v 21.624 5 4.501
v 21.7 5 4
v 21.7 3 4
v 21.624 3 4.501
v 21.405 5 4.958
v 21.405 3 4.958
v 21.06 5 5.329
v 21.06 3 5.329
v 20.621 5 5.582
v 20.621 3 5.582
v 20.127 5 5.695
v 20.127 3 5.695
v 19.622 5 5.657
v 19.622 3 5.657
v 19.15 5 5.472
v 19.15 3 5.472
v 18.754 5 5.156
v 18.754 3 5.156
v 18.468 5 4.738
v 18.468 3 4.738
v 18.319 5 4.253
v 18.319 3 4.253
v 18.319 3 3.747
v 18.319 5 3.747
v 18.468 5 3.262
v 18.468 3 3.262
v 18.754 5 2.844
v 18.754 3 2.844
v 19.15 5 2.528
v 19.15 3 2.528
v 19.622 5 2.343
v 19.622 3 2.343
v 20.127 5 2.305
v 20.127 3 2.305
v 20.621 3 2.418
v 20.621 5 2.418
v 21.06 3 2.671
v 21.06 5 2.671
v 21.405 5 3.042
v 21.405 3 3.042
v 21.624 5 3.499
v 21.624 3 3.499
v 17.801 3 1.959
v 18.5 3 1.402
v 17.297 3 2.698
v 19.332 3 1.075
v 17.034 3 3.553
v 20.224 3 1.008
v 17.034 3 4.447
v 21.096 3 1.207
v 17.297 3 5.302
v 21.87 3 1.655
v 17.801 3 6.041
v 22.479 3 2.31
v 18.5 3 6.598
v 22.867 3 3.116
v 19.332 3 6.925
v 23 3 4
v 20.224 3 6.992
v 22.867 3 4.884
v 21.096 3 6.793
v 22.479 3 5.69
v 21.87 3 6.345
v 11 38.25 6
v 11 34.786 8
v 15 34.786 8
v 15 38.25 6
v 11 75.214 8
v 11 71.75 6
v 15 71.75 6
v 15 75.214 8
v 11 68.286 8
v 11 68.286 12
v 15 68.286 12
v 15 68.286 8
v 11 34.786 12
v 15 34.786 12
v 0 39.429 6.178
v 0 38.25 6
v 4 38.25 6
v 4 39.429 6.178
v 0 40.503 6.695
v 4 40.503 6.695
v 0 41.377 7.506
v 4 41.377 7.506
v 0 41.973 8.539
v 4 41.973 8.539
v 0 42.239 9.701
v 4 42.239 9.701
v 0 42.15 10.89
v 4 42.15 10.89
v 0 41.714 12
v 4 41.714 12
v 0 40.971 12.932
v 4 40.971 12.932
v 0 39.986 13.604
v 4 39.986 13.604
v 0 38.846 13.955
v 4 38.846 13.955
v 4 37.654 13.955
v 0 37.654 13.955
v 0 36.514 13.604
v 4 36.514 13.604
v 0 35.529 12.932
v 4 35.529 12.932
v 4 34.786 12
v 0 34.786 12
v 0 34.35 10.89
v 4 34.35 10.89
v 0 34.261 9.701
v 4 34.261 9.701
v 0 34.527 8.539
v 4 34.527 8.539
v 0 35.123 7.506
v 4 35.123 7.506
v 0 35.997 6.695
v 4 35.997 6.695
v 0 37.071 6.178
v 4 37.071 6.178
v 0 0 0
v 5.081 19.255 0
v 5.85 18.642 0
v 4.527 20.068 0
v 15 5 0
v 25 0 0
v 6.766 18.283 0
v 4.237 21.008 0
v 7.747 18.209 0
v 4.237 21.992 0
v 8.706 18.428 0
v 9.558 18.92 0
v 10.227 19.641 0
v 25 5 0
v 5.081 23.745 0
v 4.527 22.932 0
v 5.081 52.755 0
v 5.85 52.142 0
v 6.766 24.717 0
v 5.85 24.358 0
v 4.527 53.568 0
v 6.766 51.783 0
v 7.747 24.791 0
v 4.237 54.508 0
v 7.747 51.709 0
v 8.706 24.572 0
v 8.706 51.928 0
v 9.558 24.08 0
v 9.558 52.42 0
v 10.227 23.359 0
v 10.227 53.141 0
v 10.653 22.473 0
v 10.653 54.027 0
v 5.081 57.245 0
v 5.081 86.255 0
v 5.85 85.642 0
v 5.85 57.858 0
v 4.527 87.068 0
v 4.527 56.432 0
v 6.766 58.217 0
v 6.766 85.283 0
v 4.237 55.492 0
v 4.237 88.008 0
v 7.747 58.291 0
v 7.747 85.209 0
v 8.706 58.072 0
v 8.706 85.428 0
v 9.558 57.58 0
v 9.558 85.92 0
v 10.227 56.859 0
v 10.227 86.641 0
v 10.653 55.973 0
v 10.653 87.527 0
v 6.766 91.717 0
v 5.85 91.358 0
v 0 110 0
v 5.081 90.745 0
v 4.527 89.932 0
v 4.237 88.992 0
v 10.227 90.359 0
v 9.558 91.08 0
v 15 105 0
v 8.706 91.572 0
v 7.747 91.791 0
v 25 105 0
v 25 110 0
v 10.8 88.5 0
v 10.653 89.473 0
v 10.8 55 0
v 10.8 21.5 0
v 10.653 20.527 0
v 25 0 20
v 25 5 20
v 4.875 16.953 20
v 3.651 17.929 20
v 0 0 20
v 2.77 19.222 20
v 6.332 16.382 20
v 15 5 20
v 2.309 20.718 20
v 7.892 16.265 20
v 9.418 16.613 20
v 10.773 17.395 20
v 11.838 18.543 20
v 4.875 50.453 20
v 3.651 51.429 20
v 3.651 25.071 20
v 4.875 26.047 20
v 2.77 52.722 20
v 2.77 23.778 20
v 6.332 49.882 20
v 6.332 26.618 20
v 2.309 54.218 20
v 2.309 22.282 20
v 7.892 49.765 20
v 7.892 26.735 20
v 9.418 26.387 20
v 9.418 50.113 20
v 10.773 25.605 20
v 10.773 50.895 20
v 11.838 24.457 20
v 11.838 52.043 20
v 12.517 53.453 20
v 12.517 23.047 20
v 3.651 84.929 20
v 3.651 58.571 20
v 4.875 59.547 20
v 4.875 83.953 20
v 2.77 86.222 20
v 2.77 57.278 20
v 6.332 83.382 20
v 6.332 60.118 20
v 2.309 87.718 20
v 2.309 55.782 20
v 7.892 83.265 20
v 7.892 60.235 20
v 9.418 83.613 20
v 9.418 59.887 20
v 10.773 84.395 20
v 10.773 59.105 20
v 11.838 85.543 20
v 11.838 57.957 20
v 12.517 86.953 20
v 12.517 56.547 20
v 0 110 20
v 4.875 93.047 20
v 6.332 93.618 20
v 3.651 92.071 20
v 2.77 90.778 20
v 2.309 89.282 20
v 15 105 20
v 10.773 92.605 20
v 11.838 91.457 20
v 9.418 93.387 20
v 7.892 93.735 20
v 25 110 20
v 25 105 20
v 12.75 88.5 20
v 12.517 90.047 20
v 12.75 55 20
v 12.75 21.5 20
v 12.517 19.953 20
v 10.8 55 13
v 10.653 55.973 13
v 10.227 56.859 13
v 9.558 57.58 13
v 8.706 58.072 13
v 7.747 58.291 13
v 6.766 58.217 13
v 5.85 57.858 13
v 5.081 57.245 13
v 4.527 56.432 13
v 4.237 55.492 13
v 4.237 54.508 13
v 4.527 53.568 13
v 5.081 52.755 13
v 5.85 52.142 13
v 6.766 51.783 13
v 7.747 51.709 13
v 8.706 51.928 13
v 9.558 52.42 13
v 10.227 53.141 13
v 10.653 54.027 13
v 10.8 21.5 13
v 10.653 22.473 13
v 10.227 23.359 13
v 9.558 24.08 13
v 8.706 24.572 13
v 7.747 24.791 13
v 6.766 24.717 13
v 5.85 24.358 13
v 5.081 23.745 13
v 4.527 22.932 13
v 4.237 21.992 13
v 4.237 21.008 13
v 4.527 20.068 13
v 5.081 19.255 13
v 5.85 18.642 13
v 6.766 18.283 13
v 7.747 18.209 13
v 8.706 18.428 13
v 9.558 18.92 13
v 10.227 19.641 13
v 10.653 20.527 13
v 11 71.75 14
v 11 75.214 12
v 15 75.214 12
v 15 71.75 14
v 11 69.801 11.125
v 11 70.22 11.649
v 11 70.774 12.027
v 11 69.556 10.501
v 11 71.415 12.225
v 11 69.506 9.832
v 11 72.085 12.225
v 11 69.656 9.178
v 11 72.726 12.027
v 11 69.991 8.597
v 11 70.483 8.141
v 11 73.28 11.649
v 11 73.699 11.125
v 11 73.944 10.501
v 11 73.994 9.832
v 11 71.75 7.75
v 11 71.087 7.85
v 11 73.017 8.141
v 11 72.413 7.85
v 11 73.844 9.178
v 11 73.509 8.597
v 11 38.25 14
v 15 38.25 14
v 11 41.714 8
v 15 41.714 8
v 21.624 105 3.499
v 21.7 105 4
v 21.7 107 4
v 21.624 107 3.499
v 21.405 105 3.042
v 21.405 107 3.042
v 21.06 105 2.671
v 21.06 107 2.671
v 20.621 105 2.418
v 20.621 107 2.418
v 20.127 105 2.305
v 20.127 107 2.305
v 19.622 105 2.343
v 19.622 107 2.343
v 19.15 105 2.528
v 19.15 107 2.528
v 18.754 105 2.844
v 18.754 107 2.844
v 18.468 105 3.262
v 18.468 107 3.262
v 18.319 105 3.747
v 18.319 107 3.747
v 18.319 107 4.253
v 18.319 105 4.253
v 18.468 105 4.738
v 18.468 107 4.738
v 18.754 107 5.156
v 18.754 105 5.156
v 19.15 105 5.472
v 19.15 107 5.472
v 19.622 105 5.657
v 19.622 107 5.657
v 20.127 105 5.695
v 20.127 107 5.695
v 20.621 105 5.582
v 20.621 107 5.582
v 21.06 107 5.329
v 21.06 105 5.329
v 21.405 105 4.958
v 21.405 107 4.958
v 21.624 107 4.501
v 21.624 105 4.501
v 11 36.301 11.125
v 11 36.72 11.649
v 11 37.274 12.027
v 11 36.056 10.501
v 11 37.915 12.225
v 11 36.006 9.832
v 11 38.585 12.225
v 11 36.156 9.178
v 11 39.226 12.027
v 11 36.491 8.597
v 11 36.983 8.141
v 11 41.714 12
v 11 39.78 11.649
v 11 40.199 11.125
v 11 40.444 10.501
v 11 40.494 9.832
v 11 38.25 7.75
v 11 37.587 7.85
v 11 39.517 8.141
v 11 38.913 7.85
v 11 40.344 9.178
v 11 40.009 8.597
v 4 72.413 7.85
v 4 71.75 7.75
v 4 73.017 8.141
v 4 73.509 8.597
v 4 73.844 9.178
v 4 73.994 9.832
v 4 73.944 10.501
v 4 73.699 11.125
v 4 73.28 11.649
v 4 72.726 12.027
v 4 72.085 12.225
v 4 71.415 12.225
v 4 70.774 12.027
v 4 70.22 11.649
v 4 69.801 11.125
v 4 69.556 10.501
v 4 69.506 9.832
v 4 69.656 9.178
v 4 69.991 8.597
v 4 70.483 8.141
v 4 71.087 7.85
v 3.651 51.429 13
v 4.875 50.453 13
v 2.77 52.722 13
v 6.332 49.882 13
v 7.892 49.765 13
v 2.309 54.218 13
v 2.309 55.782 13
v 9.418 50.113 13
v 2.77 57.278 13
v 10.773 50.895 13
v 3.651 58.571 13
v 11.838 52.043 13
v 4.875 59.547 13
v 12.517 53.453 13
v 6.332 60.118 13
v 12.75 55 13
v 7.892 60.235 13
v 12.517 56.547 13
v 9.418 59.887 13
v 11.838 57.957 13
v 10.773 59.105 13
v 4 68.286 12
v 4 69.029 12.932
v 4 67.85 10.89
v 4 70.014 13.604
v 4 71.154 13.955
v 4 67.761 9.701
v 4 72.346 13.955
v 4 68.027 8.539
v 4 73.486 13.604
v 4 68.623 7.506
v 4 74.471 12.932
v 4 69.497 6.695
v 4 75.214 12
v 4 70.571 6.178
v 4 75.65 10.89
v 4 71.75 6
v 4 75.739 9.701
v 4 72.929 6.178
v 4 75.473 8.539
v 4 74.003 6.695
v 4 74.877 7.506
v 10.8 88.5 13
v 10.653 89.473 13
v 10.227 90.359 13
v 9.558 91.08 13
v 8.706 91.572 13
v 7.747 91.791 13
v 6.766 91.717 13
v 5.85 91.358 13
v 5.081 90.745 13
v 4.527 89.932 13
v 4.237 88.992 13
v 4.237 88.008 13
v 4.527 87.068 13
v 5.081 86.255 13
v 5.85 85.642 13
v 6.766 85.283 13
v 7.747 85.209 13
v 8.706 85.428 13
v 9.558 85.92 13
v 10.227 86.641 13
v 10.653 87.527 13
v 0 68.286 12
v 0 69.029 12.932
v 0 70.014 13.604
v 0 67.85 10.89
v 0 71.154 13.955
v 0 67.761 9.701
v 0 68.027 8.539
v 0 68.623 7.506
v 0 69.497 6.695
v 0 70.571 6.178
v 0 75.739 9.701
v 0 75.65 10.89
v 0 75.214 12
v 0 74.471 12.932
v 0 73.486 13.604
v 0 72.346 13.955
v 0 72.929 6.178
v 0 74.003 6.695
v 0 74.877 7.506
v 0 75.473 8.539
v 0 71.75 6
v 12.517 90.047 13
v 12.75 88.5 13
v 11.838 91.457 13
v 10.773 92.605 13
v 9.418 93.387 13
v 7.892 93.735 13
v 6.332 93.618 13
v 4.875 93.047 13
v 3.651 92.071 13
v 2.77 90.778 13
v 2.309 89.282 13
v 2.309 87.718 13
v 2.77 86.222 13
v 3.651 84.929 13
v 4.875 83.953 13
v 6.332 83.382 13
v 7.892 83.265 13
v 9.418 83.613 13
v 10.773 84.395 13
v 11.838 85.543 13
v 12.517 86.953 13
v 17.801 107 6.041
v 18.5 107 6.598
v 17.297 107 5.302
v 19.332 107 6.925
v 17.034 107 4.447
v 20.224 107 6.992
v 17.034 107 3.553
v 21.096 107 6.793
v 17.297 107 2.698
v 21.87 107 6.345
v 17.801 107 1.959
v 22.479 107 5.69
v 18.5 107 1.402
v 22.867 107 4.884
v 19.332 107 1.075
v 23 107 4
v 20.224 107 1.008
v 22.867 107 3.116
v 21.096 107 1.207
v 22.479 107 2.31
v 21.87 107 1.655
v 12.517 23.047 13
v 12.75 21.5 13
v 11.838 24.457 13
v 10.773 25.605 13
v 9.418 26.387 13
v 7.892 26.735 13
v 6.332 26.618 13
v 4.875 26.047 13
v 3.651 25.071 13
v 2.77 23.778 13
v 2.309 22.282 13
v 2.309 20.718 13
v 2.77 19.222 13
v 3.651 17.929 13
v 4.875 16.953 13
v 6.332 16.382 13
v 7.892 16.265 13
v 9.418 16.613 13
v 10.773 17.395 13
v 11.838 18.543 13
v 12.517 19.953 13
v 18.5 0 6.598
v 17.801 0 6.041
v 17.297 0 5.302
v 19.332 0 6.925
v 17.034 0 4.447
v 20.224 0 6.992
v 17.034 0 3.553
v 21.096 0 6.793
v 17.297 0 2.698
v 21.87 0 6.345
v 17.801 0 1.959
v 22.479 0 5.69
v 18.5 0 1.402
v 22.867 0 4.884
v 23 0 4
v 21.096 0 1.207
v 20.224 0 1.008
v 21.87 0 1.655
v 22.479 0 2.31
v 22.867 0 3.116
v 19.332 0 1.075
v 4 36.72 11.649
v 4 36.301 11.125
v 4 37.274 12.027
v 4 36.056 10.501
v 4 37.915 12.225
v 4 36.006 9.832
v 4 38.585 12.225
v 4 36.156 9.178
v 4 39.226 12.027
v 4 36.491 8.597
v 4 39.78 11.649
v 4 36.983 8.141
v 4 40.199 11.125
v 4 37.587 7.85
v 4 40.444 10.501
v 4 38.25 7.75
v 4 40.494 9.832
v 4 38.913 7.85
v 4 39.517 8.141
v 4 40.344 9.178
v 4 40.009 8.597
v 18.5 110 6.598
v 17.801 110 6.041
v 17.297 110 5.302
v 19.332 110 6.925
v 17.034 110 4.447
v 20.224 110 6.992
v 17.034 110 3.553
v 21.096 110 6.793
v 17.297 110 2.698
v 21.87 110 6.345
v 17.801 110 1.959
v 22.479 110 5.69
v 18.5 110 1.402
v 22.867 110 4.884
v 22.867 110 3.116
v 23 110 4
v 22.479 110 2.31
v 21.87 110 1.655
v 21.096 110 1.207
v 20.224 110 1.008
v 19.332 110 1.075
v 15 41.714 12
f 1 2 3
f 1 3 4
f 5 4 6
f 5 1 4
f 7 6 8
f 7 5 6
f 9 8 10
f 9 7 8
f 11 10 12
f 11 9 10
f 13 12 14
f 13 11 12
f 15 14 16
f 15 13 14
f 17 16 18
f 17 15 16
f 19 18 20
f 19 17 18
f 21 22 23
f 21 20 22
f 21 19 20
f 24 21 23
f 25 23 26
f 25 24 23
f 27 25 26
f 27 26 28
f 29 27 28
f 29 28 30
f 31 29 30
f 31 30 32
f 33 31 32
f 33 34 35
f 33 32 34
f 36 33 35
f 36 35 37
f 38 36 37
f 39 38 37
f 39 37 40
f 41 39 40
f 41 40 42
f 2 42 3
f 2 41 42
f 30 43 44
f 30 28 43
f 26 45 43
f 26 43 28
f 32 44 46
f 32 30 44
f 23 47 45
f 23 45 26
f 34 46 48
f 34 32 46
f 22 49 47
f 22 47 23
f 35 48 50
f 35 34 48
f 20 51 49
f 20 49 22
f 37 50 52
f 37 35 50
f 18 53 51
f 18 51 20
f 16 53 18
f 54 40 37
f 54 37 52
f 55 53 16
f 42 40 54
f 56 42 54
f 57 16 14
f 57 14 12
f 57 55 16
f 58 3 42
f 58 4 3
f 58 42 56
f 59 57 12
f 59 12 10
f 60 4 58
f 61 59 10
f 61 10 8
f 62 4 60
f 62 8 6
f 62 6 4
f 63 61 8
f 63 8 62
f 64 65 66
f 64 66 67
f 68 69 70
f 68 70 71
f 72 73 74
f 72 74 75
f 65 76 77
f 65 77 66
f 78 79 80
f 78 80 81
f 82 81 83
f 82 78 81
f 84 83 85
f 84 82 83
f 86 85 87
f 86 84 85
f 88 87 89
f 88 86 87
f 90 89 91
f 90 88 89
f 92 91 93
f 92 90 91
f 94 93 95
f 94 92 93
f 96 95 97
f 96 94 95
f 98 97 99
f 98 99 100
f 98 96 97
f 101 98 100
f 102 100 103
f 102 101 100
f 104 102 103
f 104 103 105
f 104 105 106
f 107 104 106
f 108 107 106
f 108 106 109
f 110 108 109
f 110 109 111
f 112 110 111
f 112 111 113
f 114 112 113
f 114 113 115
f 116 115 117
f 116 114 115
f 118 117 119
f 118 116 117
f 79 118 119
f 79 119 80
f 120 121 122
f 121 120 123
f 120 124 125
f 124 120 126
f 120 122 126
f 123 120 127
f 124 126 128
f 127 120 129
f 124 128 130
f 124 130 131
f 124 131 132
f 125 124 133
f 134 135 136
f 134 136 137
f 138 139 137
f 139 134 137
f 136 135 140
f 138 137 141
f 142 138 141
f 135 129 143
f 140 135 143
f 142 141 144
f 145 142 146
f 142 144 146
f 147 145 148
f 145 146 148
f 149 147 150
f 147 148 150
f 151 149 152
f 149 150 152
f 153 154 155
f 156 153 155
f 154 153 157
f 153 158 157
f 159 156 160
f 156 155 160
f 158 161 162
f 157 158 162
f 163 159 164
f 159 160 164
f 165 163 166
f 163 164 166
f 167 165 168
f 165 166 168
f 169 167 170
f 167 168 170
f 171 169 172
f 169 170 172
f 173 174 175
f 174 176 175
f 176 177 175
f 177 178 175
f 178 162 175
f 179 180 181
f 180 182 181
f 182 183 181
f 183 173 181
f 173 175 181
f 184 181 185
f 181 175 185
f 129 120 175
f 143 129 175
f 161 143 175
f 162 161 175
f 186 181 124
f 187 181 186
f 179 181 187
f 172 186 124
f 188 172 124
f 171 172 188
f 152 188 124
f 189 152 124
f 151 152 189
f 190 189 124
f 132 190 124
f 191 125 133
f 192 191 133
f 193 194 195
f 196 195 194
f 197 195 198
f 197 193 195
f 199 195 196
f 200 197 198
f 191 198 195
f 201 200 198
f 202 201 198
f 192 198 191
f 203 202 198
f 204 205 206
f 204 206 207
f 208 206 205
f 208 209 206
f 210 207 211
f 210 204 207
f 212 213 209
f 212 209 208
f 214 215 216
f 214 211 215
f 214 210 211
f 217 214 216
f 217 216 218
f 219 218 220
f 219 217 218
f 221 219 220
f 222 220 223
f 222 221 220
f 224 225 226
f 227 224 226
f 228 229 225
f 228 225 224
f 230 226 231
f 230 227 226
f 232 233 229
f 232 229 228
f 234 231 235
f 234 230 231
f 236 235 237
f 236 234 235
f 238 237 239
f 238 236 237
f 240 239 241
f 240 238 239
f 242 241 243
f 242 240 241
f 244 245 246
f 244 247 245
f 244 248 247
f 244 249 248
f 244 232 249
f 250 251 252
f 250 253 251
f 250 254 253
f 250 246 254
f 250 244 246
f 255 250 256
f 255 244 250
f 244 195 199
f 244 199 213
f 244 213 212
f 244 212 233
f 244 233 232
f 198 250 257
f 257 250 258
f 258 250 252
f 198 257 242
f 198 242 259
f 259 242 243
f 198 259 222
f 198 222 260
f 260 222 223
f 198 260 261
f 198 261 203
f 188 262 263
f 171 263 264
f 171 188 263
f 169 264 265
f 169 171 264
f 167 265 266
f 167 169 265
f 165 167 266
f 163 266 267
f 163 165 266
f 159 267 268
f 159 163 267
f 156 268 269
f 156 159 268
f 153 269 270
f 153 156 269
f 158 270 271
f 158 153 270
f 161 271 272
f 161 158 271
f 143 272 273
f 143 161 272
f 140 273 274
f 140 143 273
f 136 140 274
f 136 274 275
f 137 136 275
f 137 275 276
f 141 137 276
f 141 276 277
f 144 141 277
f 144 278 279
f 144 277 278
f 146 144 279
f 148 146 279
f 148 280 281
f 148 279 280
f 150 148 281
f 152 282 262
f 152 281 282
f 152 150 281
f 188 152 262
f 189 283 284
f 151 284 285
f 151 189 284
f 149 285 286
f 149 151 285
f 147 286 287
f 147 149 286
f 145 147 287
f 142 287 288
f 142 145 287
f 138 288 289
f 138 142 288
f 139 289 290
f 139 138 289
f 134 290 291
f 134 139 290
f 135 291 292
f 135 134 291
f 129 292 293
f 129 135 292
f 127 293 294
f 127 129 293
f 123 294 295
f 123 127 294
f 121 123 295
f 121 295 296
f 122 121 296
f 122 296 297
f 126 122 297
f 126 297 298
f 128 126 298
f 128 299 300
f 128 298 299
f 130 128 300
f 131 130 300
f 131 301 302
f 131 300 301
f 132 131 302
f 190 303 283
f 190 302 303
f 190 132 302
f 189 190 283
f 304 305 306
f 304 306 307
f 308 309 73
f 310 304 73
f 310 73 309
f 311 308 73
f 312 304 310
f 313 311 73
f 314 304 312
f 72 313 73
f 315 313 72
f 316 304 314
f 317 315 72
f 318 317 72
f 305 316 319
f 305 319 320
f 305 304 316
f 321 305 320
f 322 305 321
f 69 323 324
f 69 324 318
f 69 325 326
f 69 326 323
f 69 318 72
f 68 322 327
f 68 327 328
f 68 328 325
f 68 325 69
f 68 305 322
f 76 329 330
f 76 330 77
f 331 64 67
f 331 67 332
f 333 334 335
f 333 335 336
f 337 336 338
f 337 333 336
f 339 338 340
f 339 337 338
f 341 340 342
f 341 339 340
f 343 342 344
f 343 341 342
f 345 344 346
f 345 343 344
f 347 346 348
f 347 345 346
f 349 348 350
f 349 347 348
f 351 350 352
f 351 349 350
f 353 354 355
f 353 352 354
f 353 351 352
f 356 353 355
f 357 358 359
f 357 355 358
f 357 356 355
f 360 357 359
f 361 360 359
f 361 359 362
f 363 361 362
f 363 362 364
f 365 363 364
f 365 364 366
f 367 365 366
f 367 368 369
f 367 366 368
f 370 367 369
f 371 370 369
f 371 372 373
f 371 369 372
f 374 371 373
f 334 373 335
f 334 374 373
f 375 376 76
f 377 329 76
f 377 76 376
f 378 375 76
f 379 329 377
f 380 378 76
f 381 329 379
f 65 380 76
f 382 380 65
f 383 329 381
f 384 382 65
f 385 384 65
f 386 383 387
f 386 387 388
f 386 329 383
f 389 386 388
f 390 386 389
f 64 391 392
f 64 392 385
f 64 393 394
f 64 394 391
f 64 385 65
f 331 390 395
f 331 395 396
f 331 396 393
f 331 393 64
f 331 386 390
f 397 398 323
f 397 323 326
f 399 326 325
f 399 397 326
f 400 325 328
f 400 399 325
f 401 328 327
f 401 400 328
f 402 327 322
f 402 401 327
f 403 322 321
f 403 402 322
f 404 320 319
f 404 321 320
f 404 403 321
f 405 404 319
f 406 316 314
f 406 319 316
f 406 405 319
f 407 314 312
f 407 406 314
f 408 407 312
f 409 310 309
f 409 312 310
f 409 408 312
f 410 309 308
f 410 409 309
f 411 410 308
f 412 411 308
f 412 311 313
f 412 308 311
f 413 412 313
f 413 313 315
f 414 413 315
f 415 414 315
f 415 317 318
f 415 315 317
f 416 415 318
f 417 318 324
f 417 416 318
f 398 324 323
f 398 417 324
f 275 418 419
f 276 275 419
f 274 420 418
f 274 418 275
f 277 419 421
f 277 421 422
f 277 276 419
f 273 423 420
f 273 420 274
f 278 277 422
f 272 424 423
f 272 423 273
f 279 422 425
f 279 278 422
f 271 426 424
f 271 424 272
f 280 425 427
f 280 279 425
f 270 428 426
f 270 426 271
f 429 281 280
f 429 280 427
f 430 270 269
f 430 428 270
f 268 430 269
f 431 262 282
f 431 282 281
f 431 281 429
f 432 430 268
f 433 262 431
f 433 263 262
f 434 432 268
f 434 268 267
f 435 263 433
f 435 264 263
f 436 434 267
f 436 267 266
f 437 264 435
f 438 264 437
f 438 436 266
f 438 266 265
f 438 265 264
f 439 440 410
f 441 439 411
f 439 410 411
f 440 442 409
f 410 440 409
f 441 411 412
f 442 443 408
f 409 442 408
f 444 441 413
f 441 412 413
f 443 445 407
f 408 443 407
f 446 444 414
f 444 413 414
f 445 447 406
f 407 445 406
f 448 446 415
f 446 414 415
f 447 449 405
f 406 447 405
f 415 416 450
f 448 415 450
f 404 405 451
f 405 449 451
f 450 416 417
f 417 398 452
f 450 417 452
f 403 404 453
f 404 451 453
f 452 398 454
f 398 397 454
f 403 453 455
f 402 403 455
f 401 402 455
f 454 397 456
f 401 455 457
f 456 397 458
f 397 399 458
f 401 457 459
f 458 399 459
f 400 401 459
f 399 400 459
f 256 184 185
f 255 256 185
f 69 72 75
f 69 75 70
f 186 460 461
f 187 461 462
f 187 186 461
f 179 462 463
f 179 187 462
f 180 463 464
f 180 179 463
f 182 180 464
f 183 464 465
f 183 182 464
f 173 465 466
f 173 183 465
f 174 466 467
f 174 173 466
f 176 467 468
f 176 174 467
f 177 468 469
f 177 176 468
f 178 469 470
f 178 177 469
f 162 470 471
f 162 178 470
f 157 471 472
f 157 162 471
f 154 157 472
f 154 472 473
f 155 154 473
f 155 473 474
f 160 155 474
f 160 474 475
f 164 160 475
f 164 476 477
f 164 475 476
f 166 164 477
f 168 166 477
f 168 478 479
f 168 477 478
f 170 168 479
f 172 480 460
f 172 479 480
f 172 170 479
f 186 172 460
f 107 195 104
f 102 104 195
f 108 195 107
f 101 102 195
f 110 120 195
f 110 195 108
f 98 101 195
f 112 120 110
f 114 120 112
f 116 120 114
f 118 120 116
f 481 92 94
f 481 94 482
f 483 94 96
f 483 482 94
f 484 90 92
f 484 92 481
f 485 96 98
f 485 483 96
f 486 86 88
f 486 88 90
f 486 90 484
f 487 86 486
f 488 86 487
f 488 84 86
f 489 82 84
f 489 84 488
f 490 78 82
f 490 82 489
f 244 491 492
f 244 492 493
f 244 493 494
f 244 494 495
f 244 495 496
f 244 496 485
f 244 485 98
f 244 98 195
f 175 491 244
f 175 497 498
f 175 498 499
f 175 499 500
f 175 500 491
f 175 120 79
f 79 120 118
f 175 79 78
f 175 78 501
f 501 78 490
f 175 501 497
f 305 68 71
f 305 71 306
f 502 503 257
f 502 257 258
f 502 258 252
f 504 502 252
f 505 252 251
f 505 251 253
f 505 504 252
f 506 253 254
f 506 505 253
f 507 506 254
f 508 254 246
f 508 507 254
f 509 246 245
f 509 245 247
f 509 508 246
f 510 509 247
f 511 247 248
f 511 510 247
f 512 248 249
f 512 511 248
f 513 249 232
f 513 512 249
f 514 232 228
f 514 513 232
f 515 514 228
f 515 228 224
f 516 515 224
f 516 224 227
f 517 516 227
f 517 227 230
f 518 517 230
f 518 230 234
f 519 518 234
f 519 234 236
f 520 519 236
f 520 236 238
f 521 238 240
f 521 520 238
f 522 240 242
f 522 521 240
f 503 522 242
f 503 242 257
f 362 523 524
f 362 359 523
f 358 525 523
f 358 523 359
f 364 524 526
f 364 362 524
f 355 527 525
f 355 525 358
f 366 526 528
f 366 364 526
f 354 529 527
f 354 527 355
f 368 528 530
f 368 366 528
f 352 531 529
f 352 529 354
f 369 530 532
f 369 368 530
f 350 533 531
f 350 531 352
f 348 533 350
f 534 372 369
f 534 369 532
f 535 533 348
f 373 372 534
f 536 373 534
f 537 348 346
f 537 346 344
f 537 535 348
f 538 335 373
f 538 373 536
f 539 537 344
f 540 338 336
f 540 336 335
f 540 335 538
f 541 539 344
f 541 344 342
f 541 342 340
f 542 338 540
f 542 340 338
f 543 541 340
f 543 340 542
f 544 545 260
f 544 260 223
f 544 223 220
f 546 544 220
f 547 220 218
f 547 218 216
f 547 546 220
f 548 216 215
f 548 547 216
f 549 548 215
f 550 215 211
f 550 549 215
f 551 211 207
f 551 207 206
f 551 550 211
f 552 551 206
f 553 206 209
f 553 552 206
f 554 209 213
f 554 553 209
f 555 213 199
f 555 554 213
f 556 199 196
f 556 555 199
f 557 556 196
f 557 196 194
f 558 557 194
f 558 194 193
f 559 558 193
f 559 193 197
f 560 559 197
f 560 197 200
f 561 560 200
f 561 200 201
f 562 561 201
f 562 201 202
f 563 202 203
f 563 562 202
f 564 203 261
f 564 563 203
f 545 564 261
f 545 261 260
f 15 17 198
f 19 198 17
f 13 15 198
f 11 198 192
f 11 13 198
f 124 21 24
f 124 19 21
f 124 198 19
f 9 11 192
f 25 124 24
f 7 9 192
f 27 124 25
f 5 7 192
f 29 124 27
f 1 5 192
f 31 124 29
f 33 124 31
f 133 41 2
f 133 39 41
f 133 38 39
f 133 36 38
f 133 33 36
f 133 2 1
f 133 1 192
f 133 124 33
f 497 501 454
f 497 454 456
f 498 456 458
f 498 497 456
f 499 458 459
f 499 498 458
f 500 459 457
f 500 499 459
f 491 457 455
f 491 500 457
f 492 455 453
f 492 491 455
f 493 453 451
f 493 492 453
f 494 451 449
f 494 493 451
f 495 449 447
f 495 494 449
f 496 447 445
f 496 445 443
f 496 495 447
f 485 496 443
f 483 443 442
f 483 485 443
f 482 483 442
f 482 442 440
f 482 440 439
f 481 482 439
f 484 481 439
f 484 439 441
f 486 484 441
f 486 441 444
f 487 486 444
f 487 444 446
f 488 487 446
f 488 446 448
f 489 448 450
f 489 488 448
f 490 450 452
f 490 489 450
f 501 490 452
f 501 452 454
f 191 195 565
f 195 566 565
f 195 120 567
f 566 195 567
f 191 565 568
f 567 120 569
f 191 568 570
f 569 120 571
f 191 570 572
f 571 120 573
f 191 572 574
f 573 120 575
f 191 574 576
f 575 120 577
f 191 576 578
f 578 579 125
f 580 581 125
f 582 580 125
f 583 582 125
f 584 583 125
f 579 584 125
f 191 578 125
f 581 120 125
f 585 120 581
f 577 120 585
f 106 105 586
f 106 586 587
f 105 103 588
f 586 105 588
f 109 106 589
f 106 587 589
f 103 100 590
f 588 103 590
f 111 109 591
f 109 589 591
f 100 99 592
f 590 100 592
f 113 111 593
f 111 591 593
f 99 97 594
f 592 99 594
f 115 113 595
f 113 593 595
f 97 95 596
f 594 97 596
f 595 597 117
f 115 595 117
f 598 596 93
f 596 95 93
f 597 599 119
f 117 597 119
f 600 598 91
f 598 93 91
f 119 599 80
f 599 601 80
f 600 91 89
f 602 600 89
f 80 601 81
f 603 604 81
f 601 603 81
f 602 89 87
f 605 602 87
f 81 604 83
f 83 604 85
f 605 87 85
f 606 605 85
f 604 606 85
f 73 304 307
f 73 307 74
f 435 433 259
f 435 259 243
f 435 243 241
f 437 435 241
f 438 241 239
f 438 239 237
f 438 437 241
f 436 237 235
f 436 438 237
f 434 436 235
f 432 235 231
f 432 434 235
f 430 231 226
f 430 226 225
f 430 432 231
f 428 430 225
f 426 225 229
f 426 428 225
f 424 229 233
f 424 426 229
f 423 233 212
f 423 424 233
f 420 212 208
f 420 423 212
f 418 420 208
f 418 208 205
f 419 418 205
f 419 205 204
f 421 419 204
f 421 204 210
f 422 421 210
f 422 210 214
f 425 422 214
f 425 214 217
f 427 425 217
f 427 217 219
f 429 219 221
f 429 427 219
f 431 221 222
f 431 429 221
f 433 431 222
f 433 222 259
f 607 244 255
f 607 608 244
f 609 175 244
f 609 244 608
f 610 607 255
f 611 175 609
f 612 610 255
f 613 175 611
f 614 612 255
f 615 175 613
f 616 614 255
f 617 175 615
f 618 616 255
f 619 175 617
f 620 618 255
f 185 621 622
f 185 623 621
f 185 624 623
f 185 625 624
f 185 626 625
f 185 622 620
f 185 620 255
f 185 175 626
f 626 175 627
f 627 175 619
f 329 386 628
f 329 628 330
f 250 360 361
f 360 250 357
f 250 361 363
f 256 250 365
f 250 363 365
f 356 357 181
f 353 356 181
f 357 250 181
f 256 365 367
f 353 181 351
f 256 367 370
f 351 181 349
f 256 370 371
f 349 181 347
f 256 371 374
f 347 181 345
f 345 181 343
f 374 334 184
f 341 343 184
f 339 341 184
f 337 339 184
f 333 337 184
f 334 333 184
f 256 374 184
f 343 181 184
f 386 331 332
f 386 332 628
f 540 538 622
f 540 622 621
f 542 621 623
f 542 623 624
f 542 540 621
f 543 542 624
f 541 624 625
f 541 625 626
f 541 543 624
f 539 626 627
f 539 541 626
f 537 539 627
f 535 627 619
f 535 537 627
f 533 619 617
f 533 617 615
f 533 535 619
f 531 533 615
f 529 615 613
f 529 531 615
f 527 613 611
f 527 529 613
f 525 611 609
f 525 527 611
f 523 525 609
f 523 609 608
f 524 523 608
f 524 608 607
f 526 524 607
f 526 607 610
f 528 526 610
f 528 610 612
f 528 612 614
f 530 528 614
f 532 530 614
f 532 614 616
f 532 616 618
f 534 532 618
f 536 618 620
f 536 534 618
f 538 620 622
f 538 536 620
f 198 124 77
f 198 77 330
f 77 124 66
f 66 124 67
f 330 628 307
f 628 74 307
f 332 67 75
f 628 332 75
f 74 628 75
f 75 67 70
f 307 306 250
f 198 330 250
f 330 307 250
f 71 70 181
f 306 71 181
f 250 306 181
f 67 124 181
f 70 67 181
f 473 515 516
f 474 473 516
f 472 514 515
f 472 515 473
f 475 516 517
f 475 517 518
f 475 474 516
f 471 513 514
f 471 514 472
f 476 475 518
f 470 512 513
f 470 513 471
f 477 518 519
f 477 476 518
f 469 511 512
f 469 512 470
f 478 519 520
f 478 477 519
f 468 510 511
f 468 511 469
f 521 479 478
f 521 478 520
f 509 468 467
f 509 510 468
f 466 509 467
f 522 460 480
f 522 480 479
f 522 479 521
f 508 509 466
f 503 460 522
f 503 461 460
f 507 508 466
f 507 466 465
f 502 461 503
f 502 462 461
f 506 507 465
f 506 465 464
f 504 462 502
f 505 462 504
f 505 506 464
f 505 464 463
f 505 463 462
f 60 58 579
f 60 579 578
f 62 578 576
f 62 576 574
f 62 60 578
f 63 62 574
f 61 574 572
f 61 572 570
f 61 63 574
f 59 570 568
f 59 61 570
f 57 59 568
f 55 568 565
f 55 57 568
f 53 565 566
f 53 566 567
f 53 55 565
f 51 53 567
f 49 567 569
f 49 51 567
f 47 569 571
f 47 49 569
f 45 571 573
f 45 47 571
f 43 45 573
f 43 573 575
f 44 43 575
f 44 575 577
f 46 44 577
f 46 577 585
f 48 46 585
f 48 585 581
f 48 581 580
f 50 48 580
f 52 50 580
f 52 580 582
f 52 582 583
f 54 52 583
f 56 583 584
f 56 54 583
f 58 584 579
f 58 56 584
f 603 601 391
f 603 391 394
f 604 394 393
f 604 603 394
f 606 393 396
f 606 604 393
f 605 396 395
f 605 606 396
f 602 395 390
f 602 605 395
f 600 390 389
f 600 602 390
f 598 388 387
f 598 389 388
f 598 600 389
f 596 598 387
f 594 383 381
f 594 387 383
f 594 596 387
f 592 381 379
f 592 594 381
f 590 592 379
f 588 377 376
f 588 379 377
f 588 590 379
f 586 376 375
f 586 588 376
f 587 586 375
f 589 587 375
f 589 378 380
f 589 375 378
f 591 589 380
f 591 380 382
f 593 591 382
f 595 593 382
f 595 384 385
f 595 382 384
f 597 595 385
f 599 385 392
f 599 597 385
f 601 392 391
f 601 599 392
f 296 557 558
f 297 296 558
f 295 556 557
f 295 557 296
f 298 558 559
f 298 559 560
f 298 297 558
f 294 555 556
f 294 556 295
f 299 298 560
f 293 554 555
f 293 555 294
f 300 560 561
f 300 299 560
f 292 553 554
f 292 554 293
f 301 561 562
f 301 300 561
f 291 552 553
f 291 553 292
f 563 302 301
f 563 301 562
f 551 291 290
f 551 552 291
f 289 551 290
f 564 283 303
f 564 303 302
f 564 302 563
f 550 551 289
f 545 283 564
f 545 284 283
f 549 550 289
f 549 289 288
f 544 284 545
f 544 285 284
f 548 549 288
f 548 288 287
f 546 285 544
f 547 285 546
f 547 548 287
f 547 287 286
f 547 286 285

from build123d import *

# Parameters (mm, degrees)
PAD001_DEPTH              = 4
BODY001_PLACEMENT_ANGLE   = 90
PAD_DEPTH                 = 4
BODY_PLACEMENT_ANGLE      = 90
CYLINDER011_R             = 2.25
CYLINDER011_DEPTH         = 15
CYLINDER010_R             = 4
CYLINDER010_DEPTH         = 4
CYLINDER009_R             = 2.25
CYLINDER009_DEPTH         = 15
CYLINDER008_R             = 4
CYLINDER008_DEPTH         = 4
CYLINDER007_R             = 1.7
CYLINDER007_DEPTH         = 15
CYLINDER006_R             = 3
CYLINDER006_DEPTH         = 3
FUSION003_PLACEMENT_ANGLE = 270
CYLINDER005_R             = 1.7
CYLINDER005_DEPTH         = 15
CYLINDER004_R             = 3
CYLINDER004_DEPTH         = 3
FUSION002_PLACEMENT_ANGLE = 90
CYLINDER001_R             = 5.25
CYLINDER001_DEPTH         = 7
CYLINDER_R                = 3.3
CYLINDER_DEPTH            = 20
ARRAY001_Y_COUNT          = 3
ARRAY001_Y_PITCH          = 33.5
BOX002_W                  = 10
BOX002_H                  = 100
BOX002_DEPTH              = 20
BOX001_W                  = 25
BOX001_H                  = 110
BOX001_DEPTH              = 20


with BuildPart() as body001:
    # Sketch001 → Pad001 (new body)
    with BuildSketch(Plane.XY):
        Polygon((4, 0), (2, 3.464102), (-2, 3.464102), (-4, 0), (-2, -3.464102), (2, -3.464102), align=None)
    extrude(amount=PAD001_DEPTH)


with BuildPart() as body001_1:
    # Body001 placement: moved
    add(body001.part.moved(Location((11, 71.75, 10))).rotate(Axis((11, 71.75, 10), (0, 1, 0)), BODY001_PLACEMENT_ANGLE))


with BuildPart() as fusion008:
    # Sketch → Pad (new body)
    with BuildSketch(Plane.XY):
        Polygon((4, 0), (2, 3.464102), (-2, 3.464102), (-4, 0), (-2, -3.464102), (2, -3.464102), align=None)
    extrude(amount=PAD_DEPTH)


with BuildPart() as fusion008_1:
    # Body placement: moved
    add(fusion008.part.moved(Location((11, 38.25, 10))).rotate(Axis((11, 38.25, 10), (0, 1, 0)), BODY_PLACEMENT_ANGLE))

    # Fusion008: union Body001
    add(body001_1.part)


with BuildPart() as cylinder011:
    # Cylinder011 → Cylinder011 (new body)
    with BuildSketch(Plane(origin=(0, 0, 0), x_dir=(0, 0, -1), z_dir=(1, 0, 0))):
        Circle(CYLINDER011_R)
    extrude(amount=CYLINDER011_DEPTH)


with BuildPart() as m4screwtpl002:
    # Cylinder010 → Cylinder010 (new body)
    with BuildSketch(Plane(origin=(0, 0, 0), x_dir=(0, 0, -1), z_dir=(1, 0, 0))):
        Circle(CYLINDER010_R)
    extrude(amount=CYLINDER010_DEPTH)

    # Fusion006: union Cylinder011
    add(cylinder011.part)


with BuildPart() as m4screwtpl002_1:
    # Fusion006 placement: moved
    add(m4screwtpl002.part.moved(Location((0, 71.75, 10))))


with BuildPart() as cylinder009:
    # Cylinder009 → Cylinder009 (new body)
    with BuildSketch(Plane(origin=(0, 0, 0), x_dir=(0, 0, -1), z_dir=(1, 0, 0))):
        Circle(CYLINDER009_R)
    extrude(amount=CYLINDER009_DEPTH)


with BuildPart() as fusion007:
    # Cylinder008 → Cylinder008 (new body)
    with BuildSketch(Plane(origin=(0, 0, 0), x_dir=(0, 0, -1), z_dir=(1, 0, 0))):
        Circle(CYLINDER008_R)
    extrude(amount=CYLINDER008_DEPTH)

    # Fusion005: union Cylinder009
    add(cylinder009.part)


with BuildPart() as fusion007_1:
    # Fusion005 placement: moved
    add(fusion007.part.moved(Location((0, 38.25, 10))))

    # Fusion007: union M4ScrewTPL002
    add(m4screwtpl002_1.part)


with BuildPart() as cylinder007:
    # Cylinder007 → Cylinder007 (new body)
    with BuildSketch(Plane.XY):
        Circle(CYLINDER007_R)
    extrude(amount=CYLINDER007_DEPTH)


with BuildPart() as m3screwtpl002:
    # Cylinder006 → Cylinder006 (new body)
    with BuildSketch(Plane.XY.offset(12)):
        Circle(CYLINDER006_R)
    extrude(amount=CYLINDER006_DEPTH)

    # Fusion003: union Cylinder007
    add(cylinder007.part)


with BuildPart() as m3screwtpl002_1:
    # Fusion003 placement: moved
    add(m3screwtpl002.part.moved(Location((20, 95, 4))).rotate(Axis((20, 95, 4), (1, 0, 0)), FUSION003_PLACEMENT_ANGLE))


with BuildPart() as cylinder005:
    # Cylinder005 → Cylinder005 (new body)
    with BuildSketch(Plane.XY):
        Circle(CYLINDER005_R)
    extrude(amount=CYLINDER005_DEPTH)


with BuildPart() as fusion004:
    # Cylinder004 → Cylinder004 (new body)
    with BuildSketch(Plane.XY.offset(12)):
        Circle(CYLINDER004_R)
    extrude(amount=CYLINDER004_DEPTH)

    # Fusion002: union Cylinder005
    add(cylinder005.part)


with BuildPart() as fusion004_1:
    # Fusion002 placement: moved
    add(fusion004.part.moved(Location((20, 15, 4))).rotate(Axis((20, 15, 4), (1, 0, 0)), FUSION002_PLACEMENT_ANGLE))

    # Fusion004: union M3ScrewTPL002
    add(m3screwtpl002_1.part)


with BuildPart() as cylinder001:
    # Cylinder001 → Cylinder001 (new body)
    with BuildSketch(Plane.XY.offset(13)):
        Circle(CYLINDER001_R)
    extrude(amount=CYLINDER001_DEPTH)


with BuildPart() as array001:
    # Cylinder → Cylinder (new body)
    with BuildSketch(Plane.XY):
        Circle(CYLINDER_R)
    extrude(amount=CYLINDER_DEPTH)

    # Fusion: union Cylinder001
    add(cylinder001.part)


with BuildPart() as array001_1:
    # Fusion placement: moved
    add(array001.part.moved(Location((7.5, 0, 0))))

    # Array001 Y: Array001 ×3


with BuildPart() as array001_2:
    add(array001_1.part)
    with Locations(*[(0, i * ARRAY001_Y_PITCH, 0) for i in range(1, ARRAY001_Y_COUNT)]):
        add(array001_1.part)


with BuildPart() as array001_3:
    # Array001 placement: moved
    add(array001_2.part.moved(Location((0, 21.5, 0))))


with BuildPart() as cube002:
    # Box002 → Box002 (new body)
    with BuildSketch(Plane(origin=(15, 5, 0), x_dir=(1, 0, 0), z_dir=(0, 0, 1))):
        with Locations((5, 50)):
            Rectangle(BOX002_W, BOX002_H)
    extrude(amount=BOX002_DEPTH)


with BuildPart() as variablechuck:
    # Box001 → Box001 (new body)
    with BuildSketch(Plane.XY):
        with Locations((12.5, 55)):
            Rectangle(BOX001_W, BOX001_H)
    extrude(amount=BOX001_DEPTH)

    # Cut: cut Cube002
    add(cube002.part, mode=Mode.SUBTRACT)

    # Cut001: cut Array001
    add(array001_3.part, mode=Mode.SUBTRACT)

    # Cut004: cut Fusion004
    add(fusion004_1.part, mode=Mode.SUBTRACT)

    # Cut005: cut Fusion007
    add(fusion007_1.part, mode=Mode.SUBTRACT)

    # Cut006: cut Fusion008
    add(fusion008_1.part, mode=Mode.SUBTRACT)


solid = variablechuck.part
